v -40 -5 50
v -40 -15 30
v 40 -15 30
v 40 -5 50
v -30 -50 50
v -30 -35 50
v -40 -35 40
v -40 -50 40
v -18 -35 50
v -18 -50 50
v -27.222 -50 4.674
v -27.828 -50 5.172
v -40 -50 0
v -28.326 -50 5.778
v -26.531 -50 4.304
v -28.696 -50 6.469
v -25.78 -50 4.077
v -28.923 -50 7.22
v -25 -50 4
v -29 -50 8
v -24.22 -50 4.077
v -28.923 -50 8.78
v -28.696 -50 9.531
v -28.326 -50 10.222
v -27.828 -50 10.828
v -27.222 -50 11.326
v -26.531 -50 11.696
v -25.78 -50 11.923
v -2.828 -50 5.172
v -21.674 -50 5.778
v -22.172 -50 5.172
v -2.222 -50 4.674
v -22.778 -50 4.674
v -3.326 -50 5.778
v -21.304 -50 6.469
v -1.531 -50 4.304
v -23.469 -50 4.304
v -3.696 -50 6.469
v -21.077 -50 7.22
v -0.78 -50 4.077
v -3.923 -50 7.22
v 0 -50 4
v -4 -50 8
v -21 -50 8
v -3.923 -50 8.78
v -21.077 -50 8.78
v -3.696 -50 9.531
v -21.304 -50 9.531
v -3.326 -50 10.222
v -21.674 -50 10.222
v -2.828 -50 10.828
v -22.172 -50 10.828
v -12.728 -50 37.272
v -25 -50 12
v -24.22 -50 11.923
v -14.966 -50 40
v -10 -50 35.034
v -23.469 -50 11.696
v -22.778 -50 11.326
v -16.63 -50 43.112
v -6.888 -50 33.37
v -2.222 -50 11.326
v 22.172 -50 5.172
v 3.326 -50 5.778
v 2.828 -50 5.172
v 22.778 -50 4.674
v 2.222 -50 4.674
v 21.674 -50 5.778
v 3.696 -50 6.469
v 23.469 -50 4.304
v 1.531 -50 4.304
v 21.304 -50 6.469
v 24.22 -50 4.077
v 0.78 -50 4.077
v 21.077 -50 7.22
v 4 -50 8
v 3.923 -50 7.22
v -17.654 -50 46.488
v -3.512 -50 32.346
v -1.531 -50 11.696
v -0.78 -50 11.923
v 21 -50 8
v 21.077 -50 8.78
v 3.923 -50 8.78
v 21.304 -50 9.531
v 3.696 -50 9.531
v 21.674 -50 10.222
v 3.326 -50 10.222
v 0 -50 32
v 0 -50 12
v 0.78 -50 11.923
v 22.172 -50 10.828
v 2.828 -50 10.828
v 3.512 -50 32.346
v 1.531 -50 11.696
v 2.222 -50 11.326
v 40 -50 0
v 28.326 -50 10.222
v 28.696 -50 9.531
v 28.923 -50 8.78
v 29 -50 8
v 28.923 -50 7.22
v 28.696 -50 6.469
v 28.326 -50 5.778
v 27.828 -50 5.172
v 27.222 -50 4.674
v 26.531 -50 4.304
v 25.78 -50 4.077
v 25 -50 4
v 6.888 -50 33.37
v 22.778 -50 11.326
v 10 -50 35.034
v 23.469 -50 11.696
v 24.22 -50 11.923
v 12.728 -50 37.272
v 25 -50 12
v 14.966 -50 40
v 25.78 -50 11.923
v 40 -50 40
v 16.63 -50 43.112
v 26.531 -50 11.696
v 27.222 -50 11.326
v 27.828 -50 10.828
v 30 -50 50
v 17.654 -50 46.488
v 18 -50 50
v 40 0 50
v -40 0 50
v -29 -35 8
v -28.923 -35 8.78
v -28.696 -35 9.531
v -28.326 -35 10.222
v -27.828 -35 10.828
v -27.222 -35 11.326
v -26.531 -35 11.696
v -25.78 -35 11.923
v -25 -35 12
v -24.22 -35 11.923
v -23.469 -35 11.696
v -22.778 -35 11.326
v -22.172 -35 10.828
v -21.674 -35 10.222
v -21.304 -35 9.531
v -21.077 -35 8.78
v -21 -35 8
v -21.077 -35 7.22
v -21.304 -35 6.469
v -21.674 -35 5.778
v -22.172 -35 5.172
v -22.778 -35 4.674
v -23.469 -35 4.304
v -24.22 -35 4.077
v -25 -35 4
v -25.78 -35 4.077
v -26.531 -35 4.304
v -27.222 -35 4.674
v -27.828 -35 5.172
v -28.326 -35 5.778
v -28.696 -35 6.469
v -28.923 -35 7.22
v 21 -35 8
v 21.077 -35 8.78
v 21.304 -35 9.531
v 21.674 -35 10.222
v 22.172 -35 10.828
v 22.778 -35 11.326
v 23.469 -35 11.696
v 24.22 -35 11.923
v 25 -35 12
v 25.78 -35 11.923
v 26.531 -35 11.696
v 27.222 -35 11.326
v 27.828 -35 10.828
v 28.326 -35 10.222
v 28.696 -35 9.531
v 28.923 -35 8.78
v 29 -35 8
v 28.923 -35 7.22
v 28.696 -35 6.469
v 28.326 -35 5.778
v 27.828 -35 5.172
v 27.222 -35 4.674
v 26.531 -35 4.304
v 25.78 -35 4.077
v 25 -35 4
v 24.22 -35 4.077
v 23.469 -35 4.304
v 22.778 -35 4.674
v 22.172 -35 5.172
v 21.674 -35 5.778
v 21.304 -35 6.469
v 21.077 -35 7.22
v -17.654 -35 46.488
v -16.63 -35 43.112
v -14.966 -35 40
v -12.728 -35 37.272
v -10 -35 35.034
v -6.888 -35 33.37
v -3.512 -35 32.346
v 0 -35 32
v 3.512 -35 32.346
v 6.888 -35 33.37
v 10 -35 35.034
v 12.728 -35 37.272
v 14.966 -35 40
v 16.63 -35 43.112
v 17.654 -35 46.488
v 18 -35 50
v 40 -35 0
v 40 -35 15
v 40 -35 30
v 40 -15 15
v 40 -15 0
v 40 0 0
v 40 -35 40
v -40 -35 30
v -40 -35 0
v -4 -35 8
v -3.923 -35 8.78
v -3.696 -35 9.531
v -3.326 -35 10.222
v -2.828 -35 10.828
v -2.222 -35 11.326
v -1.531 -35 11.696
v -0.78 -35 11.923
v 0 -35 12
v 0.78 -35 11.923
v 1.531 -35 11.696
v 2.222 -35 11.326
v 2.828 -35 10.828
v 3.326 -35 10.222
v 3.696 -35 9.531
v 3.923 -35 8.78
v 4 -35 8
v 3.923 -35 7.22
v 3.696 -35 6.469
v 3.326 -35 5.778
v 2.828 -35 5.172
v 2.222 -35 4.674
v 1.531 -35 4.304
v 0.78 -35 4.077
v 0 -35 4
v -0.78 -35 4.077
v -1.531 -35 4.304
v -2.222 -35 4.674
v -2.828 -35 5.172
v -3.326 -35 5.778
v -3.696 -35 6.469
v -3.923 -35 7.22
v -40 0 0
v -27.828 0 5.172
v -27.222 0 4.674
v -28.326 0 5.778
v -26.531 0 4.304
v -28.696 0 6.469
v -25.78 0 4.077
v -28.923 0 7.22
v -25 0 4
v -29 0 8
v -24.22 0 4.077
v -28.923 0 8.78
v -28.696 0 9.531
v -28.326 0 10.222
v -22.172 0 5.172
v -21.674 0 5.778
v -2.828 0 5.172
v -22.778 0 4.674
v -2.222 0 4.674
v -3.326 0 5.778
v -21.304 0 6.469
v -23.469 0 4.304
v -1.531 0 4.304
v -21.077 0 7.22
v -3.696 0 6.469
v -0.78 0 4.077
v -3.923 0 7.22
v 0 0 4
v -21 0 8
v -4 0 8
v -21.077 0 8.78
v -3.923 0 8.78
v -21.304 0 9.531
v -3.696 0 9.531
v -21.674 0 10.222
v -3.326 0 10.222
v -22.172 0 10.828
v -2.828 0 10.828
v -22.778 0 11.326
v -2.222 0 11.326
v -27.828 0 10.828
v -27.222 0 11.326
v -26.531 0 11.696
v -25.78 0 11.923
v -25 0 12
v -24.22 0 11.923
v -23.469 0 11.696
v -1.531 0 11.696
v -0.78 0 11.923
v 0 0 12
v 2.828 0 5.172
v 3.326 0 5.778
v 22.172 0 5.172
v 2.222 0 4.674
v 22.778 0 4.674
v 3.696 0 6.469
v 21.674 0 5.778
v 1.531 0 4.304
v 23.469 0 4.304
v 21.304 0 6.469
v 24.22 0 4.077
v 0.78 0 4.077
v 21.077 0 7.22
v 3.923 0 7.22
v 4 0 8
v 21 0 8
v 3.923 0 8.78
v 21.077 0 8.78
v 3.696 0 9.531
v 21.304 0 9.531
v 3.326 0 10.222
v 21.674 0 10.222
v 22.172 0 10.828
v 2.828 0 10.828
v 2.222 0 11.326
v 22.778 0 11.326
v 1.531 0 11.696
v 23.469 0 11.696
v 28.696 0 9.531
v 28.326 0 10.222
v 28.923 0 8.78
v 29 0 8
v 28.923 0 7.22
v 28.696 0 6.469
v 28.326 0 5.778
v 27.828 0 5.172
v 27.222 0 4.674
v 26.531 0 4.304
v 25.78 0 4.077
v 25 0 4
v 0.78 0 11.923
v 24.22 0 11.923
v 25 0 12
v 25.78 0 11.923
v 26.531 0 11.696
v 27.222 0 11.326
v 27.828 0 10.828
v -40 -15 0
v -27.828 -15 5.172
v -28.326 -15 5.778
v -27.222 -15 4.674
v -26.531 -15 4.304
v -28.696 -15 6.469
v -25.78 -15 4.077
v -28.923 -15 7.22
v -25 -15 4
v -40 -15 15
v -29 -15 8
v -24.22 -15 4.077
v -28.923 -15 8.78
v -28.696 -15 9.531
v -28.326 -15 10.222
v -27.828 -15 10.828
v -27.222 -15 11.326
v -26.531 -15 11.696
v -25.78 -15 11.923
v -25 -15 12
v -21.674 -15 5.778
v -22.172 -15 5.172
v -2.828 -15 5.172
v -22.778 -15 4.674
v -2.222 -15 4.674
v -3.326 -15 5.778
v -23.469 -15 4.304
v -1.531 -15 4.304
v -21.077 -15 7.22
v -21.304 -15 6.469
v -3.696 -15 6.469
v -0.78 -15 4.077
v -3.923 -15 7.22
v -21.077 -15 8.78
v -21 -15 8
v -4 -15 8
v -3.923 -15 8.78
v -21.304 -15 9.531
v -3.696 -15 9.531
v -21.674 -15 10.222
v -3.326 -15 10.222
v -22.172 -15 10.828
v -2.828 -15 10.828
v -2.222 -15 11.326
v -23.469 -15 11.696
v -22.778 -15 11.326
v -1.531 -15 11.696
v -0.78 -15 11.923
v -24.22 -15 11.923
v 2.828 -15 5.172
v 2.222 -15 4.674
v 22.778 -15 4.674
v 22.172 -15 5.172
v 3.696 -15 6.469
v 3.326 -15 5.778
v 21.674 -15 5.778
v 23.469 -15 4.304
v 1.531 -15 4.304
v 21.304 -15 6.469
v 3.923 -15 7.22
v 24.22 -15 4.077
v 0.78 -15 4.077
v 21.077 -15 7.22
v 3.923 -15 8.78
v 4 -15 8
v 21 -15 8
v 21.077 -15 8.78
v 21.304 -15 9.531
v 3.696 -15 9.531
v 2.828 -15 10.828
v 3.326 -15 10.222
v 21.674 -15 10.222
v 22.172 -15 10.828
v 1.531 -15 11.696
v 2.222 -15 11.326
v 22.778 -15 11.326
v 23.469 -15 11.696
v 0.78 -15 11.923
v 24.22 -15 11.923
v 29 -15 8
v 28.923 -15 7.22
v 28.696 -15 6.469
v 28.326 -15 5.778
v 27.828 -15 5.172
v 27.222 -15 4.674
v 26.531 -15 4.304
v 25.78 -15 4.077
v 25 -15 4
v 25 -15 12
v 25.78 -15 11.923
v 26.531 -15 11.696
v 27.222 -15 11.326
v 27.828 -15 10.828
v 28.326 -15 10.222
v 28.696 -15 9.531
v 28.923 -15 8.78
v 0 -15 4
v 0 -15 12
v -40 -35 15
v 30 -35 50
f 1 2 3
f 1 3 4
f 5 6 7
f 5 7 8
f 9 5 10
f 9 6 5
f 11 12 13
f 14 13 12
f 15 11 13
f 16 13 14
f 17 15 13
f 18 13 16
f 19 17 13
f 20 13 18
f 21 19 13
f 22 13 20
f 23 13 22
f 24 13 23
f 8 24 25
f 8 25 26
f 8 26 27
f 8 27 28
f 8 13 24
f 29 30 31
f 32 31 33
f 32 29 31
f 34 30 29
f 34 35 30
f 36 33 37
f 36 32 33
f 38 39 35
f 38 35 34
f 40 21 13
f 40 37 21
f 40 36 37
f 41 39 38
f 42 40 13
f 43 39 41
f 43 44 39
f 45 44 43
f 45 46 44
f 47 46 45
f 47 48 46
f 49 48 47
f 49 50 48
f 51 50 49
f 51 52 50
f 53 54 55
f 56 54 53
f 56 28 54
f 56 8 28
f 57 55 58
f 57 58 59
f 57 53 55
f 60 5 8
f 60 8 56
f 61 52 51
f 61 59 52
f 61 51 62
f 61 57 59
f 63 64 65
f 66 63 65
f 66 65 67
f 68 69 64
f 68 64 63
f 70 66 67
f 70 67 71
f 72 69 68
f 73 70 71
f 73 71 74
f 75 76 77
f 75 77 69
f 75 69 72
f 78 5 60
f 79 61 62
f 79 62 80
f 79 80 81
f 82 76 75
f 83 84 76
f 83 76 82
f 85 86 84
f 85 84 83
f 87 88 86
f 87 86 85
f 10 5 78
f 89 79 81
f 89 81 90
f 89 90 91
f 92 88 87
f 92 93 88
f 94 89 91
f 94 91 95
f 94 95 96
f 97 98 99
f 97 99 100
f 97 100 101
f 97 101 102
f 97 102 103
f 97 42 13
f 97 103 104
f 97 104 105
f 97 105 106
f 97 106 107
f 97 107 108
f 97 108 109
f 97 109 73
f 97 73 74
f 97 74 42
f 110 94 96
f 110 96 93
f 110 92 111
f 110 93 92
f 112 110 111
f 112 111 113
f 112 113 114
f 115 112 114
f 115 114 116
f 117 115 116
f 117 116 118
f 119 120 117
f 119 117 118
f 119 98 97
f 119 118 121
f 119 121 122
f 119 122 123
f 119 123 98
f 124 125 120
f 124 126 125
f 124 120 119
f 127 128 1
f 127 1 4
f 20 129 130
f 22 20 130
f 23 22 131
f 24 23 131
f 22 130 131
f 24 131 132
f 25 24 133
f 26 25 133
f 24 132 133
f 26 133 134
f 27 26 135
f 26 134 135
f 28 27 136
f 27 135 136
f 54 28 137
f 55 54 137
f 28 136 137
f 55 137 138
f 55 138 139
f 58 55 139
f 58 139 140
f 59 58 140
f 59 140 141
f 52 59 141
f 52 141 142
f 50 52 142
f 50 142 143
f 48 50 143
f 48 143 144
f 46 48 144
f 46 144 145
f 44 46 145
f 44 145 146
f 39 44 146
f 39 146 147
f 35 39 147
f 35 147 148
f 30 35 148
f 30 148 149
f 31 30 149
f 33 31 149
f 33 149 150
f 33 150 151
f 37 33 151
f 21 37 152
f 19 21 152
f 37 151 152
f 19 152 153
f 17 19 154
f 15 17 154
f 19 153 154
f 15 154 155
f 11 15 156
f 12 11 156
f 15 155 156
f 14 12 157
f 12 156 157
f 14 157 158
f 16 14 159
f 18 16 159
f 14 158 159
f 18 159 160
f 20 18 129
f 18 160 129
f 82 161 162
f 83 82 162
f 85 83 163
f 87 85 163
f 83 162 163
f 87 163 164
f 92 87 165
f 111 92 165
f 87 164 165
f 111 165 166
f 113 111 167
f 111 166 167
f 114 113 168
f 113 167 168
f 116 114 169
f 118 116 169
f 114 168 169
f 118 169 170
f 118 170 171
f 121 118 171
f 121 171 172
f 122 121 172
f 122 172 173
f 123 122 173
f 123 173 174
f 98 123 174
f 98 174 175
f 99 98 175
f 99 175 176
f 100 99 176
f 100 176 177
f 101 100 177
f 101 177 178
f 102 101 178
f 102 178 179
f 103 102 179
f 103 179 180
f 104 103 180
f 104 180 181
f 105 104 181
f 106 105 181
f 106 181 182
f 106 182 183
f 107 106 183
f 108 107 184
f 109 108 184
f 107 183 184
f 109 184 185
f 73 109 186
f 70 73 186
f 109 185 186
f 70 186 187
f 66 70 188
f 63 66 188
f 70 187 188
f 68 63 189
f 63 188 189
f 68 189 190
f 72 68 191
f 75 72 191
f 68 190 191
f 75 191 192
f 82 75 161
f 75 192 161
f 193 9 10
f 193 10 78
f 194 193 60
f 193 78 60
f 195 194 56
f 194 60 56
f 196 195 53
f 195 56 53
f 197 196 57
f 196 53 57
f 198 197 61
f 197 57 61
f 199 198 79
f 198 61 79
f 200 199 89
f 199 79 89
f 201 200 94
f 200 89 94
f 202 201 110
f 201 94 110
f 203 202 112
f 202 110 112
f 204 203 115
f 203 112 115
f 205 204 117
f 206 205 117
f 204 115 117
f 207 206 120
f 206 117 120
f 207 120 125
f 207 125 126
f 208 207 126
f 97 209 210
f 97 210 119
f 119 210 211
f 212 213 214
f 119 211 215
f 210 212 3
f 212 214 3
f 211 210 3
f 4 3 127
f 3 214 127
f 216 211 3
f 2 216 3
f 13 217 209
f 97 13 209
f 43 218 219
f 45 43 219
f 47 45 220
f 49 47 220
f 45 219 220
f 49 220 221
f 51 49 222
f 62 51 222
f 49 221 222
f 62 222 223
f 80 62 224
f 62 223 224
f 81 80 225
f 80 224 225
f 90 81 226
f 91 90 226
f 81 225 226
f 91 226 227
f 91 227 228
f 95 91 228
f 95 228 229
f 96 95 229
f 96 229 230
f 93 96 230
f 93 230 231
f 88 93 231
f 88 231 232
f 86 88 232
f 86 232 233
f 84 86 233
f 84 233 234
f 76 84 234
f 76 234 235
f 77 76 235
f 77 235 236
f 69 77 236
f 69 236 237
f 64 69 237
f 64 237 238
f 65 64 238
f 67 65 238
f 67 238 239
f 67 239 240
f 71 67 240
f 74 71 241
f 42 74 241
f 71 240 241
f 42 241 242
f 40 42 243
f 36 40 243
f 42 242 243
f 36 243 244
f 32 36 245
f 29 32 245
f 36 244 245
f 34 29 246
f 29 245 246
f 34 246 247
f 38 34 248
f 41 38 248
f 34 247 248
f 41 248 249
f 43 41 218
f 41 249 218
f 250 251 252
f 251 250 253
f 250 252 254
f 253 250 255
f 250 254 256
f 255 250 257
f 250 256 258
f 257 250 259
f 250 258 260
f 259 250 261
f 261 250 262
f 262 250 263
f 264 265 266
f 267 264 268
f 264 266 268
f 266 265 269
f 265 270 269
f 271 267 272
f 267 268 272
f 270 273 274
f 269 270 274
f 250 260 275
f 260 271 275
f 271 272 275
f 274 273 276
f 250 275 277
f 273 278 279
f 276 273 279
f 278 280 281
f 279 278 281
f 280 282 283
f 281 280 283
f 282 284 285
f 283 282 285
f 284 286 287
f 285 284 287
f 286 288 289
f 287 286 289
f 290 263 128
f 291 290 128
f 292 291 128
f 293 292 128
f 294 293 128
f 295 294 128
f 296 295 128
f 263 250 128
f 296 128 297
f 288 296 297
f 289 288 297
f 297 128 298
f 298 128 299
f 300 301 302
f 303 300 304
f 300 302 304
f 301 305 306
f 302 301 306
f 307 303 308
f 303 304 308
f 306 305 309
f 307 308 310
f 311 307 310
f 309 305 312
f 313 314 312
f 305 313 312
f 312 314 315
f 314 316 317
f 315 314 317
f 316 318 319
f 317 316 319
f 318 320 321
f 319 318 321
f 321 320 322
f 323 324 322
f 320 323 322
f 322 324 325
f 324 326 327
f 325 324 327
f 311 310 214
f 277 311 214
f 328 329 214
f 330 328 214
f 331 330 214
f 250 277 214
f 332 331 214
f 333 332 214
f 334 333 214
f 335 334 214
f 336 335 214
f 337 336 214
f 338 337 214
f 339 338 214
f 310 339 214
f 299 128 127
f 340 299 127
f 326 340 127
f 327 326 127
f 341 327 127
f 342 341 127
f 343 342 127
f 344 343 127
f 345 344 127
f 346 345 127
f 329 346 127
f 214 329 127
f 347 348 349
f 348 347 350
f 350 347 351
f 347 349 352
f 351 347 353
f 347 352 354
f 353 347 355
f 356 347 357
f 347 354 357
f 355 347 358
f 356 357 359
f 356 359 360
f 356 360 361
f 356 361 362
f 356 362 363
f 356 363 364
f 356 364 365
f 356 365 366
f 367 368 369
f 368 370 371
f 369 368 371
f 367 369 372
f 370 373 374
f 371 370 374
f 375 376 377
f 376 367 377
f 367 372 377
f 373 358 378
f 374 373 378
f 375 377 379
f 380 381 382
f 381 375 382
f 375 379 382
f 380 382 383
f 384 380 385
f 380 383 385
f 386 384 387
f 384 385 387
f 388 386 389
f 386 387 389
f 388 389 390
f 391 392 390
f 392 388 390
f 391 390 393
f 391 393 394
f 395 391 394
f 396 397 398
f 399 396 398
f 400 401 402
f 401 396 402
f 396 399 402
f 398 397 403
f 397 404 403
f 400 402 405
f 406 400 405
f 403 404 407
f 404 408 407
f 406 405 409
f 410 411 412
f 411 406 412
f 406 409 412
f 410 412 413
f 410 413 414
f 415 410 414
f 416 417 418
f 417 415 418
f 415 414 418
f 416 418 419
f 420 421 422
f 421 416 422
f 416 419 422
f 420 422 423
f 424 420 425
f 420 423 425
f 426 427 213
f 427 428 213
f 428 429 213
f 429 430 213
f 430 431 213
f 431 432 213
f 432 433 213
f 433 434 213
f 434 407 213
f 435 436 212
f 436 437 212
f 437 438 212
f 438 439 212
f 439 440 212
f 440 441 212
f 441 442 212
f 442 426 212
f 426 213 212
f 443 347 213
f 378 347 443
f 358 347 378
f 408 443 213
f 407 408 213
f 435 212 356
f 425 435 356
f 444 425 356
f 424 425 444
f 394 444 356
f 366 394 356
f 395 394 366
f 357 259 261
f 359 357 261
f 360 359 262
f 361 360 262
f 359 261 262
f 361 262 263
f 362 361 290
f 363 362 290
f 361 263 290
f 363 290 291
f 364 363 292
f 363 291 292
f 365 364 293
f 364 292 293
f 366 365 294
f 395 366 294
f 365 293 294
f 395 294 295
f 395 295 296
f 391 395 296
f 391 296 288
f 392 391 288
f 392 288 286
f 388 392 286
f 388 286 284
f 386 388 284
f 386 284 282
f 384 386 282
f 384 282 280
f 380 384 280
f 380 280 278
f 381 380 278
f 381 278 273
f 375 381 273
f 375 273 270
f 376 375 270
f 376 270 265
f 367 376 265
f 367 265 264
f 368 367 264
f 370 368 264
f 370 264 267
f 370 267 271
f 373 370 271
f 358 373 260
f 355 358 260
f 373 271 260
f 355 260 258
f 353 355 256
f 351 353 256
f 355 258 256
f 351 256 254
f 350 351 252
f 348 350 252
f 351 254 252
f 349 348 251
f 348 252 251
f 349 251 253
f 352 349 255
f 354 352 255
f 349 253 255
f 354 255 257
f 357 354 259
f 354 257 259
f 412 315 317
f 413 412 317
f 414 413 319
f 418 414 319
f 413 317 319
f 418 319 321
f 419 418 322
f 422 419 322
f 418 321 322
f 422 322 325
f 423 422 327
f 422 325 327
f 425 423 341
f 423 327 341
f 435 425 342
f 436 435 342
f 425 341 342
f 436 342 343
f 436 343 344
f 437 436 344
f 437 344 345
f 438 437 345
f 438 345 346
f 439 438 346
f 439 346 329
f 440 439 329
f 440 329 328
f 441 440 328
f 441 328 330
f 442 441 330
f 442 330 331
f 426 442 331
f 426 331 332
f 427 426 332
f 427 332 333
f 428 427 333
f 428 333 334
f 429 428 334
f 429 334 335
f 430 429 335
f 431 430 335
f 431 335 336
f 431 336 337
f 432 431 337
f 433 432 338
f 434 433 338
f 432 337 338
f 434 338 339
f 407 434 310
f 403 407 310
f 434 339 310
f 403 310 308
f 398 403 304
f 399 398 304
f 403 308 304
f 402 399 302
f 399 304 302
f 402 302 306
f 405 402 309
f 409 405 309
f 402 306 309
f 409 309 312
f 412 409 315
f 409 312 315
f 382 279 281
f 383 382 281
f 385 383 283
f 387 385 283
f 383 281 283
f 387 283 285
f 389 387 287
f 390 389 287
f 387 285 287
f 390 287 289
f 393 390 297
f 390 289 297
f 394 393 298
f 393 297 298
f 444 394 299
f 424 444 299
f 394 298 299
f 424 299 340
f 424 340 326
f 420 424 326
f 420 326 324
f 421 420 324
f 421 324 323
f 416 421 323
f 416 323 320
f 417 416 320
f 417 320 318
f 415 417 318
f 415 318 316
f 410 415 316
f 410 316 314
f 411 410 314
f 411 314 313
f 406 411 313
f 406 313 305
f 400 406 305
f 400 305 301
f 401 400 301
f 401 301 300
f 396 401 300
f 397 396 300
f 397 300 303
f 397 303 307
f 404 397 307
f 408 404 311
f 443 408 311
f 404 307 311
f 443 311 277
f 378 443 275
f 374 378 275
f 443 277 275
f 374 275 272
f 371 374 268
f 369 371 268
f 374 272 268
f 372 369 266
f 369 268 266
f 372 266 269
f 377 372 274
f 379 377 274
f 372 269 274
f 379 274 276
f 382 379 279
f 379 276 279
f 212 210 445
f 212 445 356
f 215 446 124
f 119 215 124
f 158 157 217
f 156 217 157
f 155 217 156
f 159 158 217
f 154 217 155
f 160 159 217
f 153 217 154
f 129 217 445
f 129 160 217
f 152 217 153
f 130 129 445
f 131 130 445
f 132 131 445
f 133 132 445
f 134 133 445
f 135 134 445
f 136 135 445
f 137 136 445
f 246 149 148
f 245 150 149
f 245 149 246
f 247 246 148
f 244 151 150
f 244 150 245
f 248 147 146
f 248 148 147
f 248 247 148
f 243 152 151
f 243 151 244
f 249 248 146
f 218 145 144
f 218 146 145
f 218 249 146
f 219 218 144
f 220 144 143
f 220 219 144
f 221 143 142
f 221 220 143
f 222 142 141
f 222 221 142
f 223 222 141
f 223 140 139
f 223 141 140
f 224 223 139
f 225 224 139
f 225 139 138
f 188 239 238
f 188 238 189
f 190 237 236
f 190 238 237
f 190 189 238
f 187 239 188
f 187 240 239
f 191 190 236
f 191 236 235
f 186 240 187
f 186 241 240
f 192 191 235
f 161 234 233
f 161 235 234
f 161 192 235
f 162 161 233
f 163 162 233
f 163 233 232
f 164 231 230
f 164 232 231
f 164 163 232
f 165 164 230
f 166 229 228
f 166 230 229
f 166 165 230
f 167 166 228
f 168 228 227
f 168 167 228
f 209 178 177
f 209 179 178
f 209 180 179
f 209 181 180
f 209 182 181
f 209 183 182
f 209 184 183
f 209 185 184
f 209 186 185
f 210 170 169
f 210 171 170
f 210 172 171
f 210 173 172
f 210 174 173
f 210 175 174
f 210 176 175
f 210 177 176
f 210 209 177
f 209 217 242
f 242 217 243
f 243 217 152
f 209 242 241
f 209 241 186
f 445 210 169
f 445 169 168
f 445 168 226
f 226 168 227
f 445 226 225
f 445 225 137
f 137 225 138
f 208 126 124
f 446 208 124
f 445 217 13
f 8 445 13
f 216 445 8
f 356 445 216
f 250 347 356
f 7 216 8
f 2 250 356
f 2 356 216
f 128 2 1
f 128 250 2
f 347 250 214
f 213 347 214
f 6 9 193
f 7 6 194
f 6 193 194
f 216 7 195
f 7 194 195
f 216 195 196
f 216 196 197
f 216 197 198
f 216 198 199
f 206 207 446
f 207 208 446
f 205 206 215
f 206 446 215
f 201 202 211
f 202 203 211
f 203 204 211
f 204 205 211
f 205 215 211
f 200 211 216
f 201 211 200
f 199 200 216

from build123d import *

# Parameters (mm, degrees)
F0_W     = 80
F0_H     = 50
F1_DEPTH = 50
F2_W     = 20
F2_H     = 15
F3_DEPTH = 80.001
F4_R     = 18
F5_DEPTH = 15
F7_D     = 8
F8_SIZE  = 10


with BuildPart() as f1:
    # F0 (on Front) → F1 (new body)
    with BuildSketch(Plane.XZ):
        with Locations((0, 25)):
            Rectangle(F0_W, F0_H)
    extrude(amount=F1_DEPTH)

    # F2 (on face) → F3 (cut, through all)
    with BuildSketch(Plane.YZ.offset(40)):
        with Locations((-25, 7.5)):
            Rectangle(F2_W, F2_H)
        Polygon((-5, 50), (-35, 50), (-35, 30), (-15, 30), align=None)
    extrude(amount=-F3_DEPTH, mode=Mode.SUBTRACT)

    # F4 (on face) → F5 (cut, through all)
    with BuildSketch(Plane.XZ.offset(50)):
        with Locations((0, 50)):
            Circle(F4_R)
    extrude(amount=-F5_DEPTH, mode=Mode.SUBTRACT)

    # F7 (through all)
    with Locations(Plane.XZ.offset(50)):
        with Locations((-25, 8), (0, 8), (25, 8)):
            Hole(F7_D / 2)

    # F8
    f8_edges = [f1.edges().sort_by_distance(p)[0] for p in [
        (-40, -42.5, 50),
        (40, -42.5, 50),
    ]]
    chamfer(f8_edges, length=F8_SIZE)


solid = f1.part
